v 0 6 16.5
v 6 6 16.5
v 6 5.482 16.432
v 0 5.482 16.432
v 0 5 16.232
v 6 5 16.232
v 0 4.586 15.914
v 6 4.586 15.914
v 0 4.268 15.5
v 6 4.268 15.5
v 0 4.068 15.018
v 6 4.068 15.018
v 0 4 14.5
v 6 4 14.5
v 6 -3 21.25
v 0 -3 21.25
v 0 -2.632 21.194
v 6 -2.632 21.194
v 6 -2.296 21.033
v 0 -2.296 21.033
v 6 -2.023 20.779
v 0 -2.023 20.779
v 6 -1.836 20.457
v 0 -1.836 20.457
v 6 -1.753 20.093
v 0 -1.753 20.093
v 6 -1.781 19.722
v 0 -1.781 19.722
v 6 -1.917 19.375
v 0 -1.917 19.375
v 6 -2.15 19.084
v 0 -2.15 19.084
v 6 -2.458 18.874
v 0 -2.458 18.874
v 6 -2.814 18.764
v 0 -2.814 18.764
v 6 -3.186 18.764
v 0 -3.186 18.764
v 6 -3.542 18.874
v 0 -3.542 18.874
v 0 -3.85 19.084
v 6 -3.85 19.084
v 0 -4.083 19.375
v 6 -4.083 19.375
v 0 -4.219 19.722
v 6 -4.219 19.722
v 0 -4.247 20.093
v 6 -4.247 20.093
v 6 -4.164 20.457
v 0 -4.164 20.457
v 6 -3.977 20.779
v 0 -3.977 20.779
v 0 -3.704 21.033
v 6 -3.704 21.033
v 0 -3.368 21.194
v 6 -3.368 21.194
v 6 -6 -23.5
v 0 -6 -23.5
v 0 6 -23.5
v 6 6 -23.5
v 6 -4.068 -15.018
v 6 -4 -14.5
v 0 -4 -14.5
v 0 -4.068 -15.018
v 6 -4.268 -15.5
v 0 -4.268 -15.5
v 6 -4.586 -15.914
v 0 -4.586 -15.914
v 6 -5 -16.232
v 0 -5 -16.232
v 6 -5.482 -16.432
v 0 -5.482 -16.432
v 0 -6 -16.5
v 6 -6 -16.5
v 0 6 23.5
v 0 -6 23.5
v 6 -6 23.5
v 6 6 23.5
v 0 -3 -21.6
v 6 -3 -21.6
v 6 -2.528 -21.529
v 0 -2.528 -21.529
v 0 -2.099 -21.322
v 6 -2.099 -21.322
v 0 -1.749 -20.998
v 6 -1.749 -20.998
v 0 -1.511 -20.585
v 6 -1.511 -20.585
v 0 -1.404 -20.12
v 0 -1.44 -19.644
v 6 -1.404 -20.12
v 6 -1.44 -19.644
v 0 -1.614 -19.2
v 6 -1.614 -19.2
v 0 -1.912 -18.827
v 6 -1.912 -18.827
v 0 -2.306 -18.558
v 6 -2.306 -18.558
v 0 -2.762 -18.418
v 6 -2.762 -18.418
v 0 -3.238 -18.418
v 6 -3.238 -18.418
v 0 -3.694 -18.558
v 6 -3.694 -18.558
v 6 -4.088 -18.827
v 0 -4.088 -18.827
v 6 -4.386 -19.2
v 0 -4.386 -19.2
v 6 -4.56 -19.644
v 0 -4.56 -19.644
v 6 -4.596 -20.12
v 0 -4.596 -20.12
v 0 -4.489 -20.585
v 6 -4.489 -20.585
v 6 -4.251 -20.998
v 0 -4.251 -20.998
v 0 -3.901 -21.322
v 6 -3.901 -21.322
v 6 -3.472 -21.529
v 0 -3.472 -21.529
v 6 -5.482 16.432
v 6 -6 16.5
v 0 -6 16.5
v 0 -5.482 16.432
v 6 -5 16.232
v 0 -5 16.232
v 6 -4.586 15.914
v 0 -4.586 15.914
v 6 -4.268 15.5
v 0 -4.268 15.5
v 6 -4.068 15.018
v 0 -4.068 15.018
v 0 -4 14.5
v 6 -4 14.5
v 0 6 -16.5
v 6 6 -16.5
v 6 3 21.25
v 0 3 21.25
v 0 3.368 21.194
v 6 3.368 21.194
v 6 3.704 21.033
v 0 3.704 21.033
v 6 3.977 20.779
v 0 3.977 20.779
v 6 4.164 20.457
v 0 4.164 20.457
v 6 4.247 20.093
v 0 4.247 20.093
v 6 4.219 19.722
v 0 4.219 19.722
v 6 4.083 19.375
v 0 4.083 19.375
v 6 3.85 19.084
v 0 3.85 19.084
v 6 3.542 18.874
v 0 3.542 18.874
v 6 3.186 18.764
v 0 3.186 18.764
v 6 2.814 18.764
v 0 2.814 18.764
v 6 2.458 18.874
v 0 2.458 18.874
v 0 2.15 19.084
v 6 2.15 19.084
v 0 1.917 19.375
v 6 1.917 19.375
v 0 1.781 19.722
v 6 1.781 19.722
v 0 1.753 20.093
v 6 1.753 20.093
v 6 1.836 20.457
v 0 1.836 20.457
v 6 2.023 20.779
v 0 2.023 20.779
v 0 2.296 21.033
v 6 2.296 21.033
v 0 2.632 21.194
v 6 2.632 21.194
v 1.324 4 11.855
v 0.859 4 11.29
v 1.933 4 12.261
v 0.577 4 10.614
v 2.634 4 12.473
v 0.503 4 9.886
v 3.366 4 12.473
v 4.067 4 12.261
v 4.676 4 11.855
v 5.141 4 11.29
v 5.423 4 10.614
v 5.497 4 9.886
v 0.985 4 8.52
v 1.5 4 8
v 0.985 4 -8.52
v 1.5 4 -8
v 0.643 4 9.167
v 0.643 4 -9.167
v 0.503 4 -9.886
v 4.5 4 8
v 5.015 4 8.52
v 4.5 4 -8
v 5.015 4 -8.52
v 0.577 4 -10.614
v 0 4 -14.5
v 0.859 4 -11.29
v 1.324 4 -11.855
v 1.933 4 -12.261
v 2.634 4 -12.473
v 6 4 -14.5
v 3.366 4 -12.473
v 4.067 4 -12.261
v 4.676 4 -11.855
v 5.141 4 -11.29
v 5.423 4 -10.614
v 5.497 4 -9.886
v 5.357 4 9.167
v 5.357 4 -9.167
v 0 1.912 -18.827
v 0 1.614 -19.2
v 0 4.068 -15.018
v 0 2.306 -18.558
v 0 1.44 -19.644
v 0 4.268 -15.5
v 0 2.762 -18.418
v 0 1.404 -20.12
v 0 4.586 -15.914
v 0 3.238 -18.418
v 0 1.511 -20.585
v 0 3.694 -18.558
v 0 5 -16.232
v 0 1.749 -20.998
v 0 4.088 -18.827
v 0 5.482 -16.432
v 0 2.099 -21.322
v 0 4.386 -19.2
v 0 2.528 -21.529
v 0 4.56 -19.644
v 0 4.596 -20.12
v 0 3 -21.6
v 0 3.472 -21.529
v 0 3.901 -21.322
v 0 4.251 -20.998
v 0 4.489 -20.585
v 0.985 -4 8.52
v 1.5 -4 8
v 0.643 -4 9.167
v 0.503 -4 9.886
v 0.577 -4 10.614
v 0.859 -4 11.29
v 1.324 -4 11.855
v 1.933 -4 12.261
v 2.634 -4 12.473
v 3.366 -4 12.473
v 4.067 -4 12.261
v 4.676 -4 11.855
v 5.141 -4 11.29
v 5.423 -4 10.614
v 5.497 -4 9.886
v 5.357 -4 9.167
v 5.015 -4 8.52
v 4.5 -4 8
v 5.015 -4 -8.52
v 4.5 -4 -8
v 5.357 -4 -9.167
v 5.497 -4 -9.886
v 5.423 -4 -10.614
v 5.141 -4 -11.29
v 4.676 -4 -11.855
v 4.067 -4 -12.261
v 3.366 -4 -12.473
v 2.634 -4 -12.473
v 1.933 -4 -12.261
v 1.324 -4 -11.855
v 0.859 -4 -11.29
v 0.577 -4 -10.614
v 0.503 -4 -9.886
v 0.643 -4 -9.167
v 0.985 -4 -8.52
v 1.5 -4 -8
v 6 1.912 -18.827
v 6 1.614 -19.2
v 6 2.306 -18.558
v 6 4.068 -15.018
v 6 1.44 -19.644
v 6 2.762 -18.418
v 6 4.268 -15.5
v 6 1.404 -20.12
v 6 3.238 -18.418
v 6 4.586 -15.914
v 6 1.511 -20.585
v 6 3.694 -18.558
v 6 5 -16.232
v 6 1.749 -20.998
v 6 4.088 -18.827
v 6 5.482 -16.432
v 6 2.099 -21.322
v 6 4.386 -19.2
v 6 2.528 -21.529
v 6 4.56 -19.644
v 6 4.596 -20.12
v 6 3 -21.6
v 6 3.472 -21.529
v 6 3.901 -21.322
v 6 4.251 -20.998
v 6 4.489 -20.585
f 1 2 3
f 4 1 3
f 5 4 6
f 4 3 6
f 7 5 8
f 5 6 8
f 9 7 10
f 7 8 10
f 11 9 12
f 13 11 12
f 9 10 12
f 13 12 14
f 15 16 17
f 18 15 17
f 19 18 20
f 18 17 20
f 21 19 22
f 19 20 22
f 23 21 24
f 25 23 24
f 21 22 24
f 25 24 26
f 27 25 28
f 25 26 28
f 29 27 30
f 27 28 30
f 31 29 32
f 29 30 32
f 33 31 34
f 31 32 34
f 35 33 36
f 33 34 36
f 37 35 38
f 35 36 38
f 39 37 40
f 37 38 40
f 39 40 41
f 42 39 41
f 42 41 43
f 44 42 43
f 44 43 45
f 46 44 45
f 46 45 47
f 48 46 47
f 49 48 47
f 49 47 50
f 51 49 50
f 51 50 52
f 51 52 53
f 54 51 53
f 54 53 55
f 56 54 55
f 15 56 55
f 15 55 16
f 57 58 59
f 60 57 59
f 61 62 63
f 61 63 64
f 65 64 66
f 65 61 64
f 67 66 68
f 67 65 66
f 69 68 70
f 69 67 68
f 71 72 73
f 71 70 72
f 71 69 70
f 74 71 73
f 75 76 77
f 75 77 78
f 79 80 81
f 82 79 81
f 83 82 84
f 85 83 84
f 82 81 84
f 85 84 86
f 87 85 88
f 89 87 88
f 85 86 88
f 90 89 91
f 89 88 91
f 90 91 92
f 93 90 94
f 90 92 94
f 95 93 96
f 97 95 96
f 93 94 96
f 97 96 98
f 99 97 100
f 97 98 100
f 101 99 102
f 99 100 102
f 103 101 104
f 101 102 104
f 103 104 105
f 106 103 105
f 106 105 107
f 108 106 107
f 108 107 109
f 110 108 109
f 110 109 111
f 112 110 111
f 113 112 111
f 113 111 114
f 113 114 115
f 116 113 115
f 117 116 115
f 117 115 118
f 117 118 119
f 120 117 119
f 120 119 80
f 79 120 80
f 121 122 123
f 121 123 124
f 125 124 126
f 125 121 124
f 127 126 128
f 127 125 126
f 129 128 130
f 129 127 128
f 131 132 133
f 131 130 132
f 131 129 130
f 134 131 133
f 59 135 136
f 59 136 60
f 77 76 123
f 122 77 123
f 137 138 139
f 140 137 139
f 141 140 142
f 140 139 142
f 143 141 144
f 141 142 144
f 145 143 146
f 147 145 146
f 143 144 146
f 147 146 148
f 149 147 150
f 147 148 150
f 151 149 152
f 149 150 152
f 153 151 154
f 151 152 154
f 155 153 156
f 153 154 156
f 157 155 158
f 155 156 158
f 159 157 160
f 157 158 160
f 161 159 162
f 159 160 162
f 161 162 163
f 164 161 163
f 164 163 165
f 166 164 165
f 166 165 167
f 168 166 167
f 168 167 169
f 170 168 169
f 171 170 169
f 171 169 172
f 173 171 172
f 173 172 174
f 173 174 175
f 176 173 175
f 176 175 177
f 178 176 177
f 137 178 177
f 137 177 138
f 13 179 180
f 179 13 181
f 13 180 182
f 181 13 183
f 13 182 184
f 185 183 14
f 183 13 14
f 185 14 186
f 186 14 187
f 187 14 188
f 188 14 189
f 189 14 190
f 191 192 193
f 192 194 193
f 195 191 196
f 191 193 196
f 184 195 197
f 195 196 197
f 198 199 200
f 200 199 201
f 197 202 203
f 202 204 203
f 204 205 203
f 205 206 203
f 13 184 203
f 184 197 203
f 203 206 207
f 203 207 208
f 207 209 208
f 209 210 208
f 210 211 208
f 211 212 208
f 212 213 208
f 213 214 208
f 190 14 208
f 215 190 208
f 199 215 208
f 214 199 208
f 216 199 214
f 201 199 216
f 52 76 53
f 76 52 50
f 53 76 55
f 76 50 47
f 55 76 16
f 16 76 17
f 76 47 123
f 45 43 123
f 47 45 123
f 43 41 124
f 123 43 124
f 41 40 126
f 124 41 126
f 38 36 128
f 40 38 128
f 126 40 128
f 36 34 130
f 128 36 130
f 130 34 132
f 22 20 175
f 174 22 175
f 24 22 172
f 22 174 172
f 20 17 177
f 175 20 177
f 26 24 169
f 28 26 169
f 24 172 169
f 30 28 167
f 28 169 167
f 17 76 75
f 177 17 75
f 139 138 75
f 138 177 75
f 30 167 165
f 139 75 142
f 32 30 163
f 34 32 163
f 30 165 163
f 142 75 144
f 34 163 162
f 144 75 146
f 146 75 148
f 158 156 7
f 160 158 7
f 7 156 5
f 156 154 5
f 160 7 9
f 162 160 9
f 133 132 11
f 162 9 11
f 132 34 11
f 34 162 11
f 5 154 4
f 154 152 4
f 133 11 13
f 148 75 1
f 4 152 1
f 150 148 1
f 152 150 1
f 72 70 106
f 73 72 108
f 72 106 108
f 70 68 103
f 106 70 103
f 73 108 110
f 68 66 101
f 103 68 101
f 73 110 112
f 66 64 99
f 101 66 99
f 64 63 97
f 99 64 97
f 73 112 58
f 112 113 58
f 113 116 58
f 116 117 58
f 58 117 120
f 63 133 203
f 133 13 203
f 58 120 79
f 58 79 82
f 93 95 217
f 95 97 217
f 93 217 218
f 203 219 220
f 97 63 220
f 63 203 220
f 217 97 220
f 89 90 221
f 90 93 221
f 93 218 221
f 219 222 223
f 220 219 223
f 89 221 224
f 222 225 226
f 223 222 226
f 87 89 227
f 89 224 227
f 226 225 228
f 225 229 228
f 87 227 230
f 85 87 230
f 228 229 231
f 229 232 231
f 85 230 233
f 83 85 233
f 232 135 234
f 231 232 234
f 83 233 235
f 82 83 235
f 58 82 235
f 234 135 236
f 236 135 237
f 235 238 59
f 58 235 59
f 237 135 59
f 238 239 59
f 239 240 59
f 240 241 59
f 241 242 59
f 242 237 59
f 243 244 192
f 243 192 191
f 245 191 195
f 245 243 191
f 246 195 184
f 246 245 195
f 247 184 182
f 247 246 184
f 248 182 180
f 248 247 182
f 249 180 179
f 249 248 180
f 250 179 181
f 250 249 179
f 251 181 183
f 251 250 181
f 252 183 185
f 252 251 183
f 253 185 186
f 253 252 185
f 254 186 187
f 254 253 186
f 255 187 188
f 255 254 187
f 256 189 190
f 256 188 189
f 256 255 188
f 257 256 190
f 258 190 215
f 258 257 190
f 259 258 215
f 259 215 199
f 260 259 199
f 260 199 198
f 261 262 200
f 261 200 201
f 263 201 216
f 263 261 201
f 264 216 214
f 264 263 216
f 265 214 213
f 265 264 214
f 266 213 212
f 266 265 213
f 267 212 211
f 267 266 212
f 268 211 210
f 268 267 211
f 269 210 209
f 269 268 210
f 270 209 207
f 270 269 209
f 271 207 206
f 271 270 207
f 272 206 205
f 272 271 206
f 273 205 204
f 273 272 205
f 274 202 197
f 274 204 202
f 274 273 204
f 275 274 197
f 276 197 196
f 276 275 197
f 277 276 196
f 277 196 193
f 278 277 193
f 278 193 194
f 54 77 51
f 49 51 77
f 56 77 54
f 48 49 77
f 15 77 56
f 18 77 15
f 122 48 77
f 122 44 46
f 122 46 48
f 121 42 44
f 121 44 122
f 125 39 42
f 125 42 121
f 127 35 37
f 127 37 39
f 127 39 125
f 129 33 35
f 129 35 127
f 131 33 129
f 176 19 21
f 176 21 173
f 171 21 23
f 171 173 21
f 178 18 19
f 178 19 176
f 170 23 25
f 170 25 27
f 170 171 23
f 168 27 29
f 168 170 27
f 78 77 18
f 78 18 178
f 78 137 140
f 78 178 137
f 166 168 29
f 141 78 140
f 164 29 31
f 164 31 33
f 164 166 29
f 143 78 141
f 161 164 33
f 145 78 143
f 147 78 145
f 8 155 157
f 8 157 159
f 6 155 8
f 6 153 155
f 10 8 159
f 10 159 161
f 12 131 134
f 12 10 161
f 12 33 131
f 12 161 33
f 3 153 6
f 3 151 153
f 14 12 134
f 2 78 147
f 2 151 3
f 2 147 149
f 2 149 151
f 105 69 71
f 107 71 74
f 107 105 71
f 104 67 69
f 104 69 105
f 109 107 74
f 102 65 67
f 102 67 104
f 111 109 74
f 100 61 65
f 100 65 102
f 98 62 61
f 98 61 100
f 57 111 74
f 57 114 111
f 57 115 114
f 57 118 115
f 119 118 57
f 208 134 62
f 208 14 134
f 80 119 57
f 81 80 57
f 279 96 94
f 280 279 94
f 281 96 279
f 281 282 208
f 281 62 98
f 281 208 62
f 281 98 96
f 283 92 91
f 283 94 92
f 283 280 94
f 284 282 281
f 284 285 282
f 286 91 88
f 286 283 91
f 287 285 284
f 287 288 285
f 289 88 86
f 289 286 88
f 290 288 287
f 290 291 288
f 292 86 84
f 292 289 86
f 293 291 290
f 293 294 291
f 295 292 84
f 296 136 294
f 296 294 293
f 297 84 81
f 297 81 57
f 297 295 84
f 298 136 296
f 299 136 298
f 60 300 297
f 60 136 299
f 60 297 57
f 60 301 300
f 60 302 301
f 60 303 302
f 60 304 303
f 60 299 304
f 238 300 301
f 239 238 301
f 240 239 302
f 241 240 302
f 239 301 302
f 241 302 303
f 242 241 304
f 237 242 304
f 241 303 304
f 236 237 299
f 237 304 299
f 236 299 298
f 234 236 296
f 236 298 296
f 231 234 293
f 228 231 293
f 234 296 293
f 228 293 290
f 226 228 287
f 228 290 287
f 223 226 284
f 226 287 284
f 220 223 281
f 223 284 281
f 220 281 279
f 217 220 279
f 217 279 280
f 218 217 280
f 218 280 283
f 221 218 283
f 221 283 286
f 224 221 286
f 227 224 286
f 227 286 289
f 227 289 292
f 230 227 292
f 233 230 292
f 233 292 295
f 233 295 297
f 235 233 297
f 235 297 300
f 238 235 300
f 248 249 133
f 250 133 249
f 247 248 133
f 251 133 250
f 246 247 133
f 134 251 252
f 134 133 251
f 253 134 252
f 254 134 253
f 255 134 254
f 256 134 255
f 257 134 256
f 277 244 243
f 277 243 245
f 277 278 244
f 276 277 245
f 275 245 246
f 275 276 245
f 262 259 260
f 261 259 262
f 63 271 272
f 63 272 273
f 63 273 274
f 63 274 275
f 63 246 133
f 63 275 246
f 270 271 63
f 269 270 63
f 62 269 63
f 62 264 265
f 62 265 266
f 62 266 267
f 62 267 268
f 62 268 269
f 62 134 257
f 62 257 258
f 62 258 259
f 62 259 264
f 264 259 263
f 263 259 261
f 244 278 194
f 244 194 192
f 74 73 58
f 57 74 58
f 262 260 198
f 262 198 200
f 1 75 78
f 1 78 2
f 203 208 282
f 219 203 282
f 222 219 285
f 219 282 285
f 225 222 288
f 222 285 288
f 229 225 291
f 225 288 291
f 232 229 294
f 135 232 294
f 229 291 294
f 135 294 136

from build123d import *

# Parameters (mm, degrees)
SKETCH1_W                 = 47
SKETCH1_H                 = 12
BOSS_EXTRUDE1_DEPTH       = 6
CUT_EXTRUDE2_DEPTH        = 25.984995497
SKETCH4_R                 = 1.6
CUT_EXTRUDE3_DEPTH        = 25.984995497
M3X0_5_TAPPED_HOLE1_D     = 2.5
M3X0_5_TAPPED_HOLE1_DEPTH = 7.5
M3X0_5_TAPPED_HOLE1_TIP   = 0.751075774
CUT_EXTRUDE4_DEPTH        = 27.234519245


with BuildPart() as part:
    # Sketch1 → Boss-Extrude1 (new body)
    with BuildSketch(Plane(origin=(0, 0, 0), x_dir=(0, 0, -1), z_dir=(1, 0, 0))):
        Rectangle(SKETCH1_W, SKETCH1_H)
    extrude(amount=BOSS_EXTRUDE1_DEPTH)

    # Sketch3 → Cut-Extrude2 (cut, through all)
    with BuildSketch(Plane(origin=(6, 0, 0), x_dir=(0, 0, -1), z_dir=(1, 0, 0))):
        with BuildLine():
            Line((16.5, 6), (-16.5, 6))
            ThreePointArc((-16.5, 6), (-15.914213562, 4.585786438), (-14.5, 4))
            Line((-14.5, 4), (14.5, 4))
            ThreePointArc((14.5, 4), (15.914213562, 4.585786438), (16.5, 6))
        make_face()
        with BuildLine():
            Line((-14.5, -4), (14.5, -4))
            ThreePointArc((14.5, -4), (15.914213562, -4.585786438), (16.5, -6))
            Line((16.5, -6), (-16.5, -6))
            ThreePointArc((-16.5, -6), (-15.914213562, -4.585786438), (-14.5, -4))
        make_face()
    extrude(amount=-CUT_EXTRUDE2_DEPTH, mode=Mode.SUBTRACT)

    # Sketch4 → Cut-Extrude3 (cut, through all)
    with BuildSketch(Plane(origin=(6, 0, 0), x_dir=(0, 0, -1), z_dir=(1, 0, 0))):
        with Locations((20, 3)):
            Circle(SKETCH4_R)
        with Locations((20, -3)):
            Circle(SKETCH4_R)
    extrude(amount=-CUT_EXTRUDE3_DEPTH, mode=Mode.SUBTRACT)

    # M3x0.5 Tapped Hole1
    with Locations(Plane(origin=(6, 0, 0), x_dir=(0, 0, -1), z_dir=(1, 0, 0))):
        with Locations((-20, 3), (-20, -3)):
            Hole(M3X0_5_TAPPED_HOLE1_D / 2, depth=M3X0_5_TAPPED_HOLE1_DEPTH)
            with Locations((0, 0, -(M3X0_5_TAPPED_HOLE1_DEPTH + M3X0_5_TAPPED_HOLE1_TIP / 2))):  # 118° drill point
                Cone(0, M3X0_5_TAPPED_HOLE1_D / 2, M3X0_5_TAPPED_HOLE1_TIP, mode=Mode.SUBTRACT)

    # Sketch8 → Cut-Extrude4 (cut, through all)
    with BuildSketch(Plane.XZ.offset(4)):
        with BuildLine():
            Line((4.5, 8), (4.5, -8))
            ThreePointArc((4.5, -8), (3, -12.5), (1.5, -8))
            Line((1.5, -8), (1.5, 8))
            ThreePointArc((1.5, 8), (3, 12.5), (4.5, 8))
        make_face()
    extrude(amount=-CUT_EXTRUDE4_DEPTH, mode=Mode.SUBTRACT)


solid = part.part
